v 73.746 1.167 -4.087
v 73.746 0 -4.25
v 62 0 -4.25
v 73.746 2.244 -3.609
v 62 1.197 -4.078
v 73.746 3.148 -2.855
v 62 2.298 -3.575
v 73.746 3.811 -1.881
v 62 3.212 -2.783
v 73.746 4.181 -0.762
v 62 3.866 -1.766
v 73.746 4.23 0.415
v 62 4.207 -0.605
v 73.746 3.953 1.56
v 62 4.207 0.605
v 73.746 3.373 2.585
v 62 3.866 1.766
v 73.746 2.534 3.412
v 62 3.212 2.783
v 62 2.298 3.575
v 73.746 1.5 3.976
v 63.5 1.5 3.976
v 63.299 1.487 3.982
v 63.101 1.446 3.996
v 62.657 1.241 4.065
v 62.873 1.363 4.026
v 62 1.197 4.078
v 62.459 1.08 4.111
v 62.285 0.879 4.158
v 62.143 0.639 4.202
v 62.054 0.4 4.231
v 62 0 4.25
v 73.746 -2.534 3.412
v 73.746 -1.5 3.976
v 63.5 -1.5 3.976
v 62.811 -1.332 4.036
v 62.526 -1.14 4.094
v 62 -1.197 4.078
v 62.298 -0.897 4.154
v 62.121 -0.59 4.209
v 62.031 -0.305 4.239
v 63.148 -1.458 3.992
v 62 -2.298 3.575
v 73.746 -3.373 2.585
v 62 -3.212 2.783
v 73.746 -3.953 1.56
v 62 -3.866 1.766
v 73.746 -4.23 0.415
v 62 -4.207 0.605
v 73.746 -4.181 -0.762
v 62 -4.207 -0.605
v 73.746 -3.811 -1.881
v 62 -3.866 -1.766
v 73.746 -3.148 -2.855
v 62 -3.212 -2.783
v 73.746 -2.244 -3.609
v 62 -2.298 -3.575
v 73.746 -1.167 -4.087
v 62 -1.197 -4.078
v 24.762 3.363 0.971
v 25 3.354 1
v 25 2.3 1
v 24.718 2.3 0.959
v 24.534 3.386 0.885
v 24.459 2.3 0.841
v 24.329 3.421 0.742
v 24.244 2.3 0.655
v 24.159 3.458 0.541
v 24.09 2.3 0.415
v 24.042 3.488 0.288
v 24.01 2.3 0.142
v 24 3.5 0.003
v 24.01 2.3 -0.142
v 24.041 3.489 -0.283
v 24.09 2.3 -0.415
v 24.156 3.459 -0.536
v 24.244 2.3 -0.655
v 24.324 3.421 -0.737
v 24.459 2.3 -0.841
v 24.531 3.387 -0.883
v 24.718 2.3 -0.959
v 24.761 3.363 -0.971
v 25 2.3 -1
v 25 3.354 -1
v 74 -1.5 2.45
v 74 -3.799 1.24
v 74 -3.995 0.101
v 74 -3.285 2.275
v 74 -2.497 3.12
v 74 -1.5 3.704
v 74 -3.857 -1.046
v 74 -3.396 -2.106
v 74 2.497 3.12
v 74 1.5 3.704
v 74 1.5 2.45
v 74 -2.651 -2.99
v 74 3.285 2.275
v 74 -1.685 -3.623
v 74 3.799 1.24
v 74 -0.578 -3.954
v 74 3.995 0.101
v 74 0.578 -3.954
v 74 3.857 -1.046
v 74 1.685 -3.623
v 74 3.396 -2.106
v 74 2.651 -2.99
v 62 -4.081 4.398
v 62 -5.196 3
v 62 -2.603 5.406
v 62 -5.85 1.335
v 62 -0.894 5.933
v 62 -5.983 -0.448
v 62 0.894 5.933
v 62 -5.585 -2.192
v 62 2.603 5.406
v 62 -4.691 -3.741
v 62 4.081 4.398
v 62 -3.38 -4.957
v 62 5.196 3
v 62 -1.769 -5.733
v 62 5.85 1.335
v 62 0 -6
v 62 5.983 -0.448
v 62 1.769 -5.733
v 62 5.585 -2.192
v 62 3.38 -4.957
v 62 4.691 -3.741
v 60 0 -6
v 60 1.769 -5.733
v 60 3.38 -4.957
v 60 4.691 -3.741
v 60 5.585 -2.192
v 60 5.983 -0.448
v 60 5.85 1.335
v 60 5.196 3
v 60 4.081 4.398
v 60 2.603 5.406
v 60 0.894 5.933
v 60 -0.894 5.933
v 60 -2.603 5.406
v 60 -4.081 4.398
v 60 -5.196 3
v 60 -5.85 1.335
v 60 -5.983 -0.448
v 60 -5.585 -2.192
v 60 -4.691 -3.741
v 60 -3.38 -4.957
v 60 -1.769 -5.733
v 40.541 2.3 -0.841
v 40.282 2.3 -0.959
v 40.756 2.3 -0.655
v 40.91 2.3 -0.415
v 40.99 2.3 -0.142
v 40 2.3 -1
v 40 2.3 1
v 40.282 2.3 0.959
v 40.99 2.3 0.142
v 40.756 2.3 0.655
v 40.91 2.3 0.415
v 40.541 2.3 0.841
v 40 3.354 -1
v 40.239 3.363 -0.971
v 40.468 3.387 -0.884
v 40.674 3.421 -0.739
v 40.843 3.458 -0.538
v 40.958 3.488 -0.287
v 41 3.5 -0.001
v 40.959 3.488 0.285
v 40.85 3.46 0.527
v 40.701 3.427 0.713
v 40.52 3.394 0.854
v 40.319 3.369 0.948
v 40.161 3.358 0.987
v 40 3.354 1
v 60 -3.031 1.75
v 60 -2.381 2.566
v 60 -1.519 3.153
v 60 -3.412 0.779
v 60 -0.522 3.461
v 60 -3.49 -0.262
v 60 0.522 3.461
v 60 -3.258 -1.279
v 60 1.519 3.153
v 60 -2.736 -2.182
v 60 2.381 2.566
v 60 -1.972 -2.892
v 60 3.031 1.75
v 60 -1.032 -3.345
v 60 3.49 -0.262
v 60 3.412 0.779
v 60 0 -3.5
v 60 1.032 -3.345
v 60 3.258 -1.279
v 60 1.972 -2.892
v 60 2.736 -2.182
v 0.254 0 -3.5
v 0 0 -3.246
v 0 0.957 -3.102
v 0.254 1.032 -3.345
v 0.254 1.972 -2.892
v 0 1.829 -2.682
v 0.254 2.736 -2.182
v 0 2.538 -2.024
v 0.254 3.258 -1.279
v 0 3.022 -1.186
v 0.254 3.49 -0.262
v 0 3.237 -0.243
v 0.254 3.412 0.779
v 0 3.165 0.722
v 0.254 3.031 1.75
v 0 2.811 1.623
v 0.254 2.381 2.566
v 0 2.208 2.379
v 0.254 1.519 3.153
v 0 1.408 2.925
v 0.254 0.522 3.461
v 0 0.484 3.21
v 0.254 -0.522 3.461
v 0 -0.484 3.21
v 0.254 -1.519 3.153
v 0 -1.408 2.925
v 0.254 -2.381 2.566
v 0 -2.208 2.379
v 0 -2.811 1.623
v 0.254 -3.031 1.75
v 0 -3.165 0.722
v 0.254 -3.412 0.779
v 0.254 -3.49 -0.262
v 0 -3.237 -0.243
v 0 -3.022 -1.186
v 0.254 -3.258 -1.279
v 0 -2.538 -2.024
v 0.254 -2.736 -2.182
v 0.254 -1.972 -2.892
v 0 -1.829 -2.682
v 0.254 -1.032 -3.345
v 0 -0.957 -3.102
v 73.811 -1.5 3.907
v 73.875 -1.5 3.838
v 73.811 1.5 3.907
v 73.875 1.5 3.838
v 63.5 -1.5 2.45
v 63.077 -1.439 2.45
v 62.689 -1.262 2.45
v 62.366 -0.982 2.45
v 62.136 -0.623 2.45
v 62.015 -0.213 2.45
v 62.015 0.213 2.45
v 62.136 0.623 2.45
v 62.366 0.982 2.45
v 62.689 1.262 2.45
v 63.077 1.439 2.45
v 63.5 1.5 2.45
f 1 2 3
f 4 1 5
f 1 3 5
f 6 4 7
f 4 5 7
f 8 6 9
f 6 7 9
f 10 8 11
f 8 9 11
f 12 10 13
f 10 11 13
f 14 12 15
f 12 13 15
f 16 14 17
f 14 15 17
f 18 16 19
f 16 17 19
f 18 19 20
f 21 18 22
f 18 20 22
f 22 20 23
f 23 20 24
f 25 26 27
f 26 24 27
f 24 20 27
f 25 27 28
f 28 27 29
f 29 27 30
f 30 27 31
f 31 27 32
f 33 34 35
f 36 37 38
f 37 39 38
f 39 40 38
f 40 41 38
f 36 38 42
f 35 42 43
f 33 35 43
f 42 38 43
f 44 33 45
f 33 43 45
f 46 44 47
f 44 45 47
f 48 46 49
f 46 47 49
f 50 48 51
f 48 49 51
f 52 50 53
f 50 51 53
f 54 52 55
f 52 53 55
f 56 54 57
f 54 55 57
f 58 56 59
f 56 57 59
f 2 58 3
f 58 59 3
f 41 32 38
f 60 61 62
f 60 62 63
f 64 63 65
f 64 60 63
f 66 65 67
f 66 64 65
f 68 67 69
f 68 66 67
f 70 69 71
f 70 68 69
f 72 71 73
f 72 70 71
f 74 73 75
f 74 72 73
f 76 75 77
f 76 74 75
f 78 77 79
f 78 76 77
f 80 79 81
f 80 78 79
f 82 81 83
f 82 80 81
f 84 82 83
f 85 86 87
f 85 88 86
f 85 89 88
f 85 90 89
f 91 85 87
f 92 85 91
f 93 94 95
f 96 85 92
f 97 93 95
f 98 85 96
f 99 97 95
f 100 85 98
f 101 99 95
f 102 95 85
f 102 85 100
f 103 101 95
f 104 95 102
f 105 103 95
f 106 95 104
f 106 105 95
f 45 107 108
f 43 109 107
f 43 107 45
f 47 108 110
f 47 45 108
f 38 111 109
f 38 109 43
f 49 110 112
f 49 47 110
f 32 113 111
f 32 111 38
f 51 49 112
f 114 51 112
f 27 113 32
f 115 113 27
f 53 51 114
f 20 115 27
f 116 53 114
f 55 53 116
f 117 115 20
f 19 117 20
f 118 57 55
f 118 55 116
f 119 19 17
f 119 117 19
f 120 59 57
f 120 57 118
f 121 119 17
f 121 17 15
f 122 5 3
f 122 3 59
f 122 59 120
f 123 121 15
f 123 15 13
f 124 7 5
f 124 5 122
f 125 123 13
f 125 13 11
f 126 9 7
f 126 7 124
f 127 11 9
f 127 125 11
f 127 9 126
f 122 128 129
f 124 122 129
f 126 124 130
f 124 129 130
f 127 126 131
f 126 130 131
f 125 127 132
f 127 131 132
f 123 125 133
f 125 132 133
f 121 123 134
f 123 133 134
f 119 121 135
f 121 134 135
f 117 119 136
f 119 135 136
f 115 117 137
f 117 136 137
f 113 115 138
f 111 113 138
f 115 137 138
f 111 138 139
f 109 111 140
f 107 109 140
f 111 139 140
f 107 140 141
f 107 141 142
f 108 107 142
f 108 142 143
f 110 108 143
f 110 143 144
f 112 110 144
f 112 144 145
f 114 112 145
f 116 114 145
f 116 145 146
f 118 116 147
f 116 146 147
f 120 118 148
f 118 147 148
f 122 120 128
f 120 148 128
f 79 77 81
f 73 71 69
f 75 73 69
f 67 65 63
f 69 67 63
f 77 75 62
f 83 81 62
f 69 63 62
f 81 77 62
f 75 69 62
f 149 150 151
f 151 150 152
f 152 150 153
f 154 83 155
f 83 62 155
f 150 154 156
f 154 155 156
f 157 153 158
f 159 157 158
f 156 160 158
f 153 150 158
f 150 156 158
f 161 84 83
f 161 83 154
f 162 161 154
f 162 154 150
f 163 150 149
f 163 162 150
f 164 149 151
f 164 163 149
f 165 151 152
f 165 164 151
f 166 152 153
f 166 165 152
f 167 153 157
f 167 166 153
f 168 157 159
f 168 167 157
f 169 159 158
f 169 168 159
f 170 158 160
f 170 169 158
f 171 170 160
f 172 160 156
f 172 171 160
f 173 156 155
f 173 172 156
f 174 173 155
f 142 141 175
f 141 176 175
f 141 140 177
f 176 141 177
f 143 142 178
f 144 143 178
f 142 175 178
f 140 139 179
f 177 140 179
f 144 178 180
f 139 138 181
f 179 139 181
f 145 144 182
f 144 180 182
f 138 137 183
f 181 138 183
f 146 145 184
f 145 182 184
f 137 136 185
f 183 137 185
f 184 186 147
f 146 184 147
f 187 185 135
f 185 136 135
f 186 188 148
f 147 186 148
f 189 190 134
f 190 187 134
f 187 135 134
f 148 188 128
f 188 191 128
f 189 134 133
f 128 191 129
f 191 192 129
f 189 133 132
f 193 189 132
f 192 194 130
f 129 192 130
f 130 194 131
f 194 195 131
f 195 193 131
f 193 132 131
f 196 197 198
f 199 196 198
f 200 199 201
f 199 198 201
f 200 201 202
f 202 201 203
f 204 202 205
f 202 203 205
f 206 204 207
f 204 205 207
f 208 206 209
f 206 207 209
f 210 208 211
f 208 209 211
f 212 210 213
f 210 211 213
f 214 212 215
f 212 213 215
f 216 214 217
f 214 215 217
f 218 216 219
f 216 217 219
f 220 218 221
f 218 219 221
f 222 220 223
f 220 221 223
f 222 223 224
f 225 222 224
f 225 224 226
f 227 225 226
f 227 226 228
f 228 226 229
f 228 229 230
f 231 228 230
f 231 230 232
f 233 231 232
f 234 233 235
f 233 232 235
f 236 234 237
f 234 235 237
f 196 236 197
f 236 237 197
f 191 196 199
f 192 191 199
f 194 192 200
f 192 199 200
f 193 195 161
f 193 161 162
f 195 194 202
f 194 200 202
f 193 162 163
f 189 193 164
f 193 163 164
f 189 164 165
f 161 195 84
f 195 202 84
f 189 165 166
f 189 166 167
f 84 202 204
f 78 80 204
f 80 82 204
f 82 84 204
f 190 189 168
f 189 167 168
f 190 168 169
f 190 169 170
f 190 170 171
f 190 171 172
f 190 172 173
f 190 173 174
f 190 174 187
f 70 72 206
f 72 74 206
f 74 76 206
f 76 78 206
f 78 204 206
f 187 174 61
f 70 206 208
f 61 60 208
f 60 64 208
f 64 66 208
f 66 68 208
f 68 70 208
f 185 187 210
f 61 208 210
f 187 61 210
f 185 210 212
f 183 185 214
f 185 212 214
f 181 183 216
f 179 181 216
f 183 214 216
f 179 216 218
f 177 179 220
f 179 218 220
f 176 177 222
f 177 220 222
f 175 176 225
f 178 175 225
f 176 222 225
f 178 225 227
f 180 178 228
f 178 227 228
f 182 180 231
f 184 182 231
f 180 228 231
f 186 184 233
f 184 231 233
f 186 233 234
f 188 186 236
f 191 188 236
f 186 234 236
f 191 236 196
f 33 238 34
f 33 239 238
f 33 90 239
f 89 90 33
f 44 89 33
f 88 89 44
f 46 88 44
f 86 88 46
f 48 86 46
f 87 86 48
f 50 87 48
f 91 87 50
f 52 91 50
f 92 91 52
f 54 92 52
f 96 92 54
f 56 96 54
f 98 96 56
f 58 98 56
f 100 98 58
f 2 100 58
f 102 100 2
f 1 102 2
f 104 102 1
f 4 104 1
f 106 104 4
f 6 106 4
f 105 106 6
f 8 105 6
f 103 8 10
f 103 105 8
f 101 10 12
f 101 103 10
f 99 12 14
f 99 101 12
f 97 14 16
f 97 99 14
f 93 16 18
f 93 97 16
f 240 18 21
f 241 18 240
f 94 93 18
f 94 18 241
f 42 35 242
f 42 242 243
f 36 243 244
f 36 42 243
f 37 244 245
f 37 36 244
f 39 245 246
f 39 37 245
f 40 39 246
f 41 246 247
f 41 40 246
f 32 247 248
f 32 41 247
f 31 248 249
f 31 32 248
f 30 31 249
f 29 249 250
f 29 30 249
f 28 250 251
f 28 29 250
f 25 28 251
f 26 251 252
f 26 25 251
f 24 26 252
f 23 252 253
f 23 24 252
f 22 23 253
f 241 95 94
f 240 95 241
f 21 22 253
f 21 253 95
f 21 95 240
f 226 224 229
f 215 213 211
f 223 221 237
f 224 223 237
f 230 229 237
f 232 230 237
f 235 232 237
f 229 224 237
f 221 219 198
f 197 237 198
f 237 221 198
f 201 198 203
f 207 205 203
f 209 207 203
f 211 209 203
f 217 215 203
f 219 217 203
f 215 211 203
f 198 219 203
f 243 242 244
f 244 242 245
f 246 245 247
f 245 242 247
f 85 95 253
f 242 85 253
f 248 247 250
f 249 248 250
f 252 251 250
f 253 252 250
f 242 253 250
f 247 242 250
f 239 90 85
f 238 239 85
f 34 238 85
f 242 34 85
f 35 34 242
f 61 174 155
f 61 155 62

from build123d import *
from build123d.topology import SkipClean

# Parameters (mm, degrees)
SKETCH1_R            = 3.5
SHAFT_BOSS_DEPTH     = 60
CUT_2X2_KEYWAY_DEPTH = 1.2
SKETCH3_R            = 6
COLLAR_BOSS_DEPTH    = 2
SKETCH4_R            = 4.25
HANDLE_BOSS_DEPTH    = 12
CUT_3X3_KEYWAY_DEPTH = 1.8
CHAMFER1_SIZE        = 0.254


with BuildPart() as part:
    # Sketch1 → Shaft-Boss (new body)
    with BuildSketch(Plane(origin=(0, 0, 0), x_dir=(0, 0, -1), z_dir=(1, 0, 0))):
        Circle(SKETCH1_R)
    extrude(amount=SHAFT_BOSS_DEPTH)

    # Sketch2 → Cut-2x2 Keyway (cut)
    with BuildSketch(Plane(origin=(0, 3.5, 0), x_dir=(-1, 0, 0), z_dir=(0, 1, 0))):
        with BuildLine():
            Line((-25, -1), (-40, -1))
            ThreePointArc((-40, -1), (-41, 0), (-40, 1))
            Line((-40, 1), (-25, 1))
            ThreePointArc((-25, 1), (-24, 0), (-25, -1))
        make_face()
    extrude(amount=-CUT_2X2_KEYWAY_DEPTH, mode=Mode.SUBTRACT)

    # Sketch3 → Collar-Boss (add)
    with BuildSketch(Plane(origin=(60, 0, 0), x_dir=(0, 0, -1), z_dir=(1, 0, 0))):
        Circle(SKETCH3_R)
    extrude(amount=COLLAR_BOSS_DEPTH)

    # Sketch4 → Handle-Boss (add)
    with BuildSketch(Plane(origin=(62, 0, 0), x_dir=(0, 0, -1), z_dir=(1, 0, 0))):
        Circle(SKETCH4_R)
    extrude(amount=HANDLE_BOSS_DEPTH)

    # Sketch5 → Cut-3x3 Keyway (cut)
    with SkipClean():  # the faces are left unmerged after this step: merging them gives an invalid solid
        with BuildSketch(Plane.XY.offset(4.25)):
            with BuildLine():
                Line((83.5, -1.5), (63.5, -1.5))
                ThreePointArc((63.5, -1.5), (62, 0), (63.5, 1.5))
                Line((63.5, 1.5), (83.5, 1.5))
                ThreePointArc((83.5, 1.5), (85, 0), (83.5, -1.5))
            make_face()
        extrude(amount=-CUT_3X3_KEYWAY_DEPTH, mode=Mode.SUBTRACT)

    # Chamfer1
    chamfer1_edges = [part.edges().sort_by_distance(p)[0] for p in [
        (0, 0, 3.5),
        (74, -4.181064283, -0.7623657),
    ]]
    chamfer(chamfer1_edges, length=CHAMFER1_SIZE)


solid = part.part
